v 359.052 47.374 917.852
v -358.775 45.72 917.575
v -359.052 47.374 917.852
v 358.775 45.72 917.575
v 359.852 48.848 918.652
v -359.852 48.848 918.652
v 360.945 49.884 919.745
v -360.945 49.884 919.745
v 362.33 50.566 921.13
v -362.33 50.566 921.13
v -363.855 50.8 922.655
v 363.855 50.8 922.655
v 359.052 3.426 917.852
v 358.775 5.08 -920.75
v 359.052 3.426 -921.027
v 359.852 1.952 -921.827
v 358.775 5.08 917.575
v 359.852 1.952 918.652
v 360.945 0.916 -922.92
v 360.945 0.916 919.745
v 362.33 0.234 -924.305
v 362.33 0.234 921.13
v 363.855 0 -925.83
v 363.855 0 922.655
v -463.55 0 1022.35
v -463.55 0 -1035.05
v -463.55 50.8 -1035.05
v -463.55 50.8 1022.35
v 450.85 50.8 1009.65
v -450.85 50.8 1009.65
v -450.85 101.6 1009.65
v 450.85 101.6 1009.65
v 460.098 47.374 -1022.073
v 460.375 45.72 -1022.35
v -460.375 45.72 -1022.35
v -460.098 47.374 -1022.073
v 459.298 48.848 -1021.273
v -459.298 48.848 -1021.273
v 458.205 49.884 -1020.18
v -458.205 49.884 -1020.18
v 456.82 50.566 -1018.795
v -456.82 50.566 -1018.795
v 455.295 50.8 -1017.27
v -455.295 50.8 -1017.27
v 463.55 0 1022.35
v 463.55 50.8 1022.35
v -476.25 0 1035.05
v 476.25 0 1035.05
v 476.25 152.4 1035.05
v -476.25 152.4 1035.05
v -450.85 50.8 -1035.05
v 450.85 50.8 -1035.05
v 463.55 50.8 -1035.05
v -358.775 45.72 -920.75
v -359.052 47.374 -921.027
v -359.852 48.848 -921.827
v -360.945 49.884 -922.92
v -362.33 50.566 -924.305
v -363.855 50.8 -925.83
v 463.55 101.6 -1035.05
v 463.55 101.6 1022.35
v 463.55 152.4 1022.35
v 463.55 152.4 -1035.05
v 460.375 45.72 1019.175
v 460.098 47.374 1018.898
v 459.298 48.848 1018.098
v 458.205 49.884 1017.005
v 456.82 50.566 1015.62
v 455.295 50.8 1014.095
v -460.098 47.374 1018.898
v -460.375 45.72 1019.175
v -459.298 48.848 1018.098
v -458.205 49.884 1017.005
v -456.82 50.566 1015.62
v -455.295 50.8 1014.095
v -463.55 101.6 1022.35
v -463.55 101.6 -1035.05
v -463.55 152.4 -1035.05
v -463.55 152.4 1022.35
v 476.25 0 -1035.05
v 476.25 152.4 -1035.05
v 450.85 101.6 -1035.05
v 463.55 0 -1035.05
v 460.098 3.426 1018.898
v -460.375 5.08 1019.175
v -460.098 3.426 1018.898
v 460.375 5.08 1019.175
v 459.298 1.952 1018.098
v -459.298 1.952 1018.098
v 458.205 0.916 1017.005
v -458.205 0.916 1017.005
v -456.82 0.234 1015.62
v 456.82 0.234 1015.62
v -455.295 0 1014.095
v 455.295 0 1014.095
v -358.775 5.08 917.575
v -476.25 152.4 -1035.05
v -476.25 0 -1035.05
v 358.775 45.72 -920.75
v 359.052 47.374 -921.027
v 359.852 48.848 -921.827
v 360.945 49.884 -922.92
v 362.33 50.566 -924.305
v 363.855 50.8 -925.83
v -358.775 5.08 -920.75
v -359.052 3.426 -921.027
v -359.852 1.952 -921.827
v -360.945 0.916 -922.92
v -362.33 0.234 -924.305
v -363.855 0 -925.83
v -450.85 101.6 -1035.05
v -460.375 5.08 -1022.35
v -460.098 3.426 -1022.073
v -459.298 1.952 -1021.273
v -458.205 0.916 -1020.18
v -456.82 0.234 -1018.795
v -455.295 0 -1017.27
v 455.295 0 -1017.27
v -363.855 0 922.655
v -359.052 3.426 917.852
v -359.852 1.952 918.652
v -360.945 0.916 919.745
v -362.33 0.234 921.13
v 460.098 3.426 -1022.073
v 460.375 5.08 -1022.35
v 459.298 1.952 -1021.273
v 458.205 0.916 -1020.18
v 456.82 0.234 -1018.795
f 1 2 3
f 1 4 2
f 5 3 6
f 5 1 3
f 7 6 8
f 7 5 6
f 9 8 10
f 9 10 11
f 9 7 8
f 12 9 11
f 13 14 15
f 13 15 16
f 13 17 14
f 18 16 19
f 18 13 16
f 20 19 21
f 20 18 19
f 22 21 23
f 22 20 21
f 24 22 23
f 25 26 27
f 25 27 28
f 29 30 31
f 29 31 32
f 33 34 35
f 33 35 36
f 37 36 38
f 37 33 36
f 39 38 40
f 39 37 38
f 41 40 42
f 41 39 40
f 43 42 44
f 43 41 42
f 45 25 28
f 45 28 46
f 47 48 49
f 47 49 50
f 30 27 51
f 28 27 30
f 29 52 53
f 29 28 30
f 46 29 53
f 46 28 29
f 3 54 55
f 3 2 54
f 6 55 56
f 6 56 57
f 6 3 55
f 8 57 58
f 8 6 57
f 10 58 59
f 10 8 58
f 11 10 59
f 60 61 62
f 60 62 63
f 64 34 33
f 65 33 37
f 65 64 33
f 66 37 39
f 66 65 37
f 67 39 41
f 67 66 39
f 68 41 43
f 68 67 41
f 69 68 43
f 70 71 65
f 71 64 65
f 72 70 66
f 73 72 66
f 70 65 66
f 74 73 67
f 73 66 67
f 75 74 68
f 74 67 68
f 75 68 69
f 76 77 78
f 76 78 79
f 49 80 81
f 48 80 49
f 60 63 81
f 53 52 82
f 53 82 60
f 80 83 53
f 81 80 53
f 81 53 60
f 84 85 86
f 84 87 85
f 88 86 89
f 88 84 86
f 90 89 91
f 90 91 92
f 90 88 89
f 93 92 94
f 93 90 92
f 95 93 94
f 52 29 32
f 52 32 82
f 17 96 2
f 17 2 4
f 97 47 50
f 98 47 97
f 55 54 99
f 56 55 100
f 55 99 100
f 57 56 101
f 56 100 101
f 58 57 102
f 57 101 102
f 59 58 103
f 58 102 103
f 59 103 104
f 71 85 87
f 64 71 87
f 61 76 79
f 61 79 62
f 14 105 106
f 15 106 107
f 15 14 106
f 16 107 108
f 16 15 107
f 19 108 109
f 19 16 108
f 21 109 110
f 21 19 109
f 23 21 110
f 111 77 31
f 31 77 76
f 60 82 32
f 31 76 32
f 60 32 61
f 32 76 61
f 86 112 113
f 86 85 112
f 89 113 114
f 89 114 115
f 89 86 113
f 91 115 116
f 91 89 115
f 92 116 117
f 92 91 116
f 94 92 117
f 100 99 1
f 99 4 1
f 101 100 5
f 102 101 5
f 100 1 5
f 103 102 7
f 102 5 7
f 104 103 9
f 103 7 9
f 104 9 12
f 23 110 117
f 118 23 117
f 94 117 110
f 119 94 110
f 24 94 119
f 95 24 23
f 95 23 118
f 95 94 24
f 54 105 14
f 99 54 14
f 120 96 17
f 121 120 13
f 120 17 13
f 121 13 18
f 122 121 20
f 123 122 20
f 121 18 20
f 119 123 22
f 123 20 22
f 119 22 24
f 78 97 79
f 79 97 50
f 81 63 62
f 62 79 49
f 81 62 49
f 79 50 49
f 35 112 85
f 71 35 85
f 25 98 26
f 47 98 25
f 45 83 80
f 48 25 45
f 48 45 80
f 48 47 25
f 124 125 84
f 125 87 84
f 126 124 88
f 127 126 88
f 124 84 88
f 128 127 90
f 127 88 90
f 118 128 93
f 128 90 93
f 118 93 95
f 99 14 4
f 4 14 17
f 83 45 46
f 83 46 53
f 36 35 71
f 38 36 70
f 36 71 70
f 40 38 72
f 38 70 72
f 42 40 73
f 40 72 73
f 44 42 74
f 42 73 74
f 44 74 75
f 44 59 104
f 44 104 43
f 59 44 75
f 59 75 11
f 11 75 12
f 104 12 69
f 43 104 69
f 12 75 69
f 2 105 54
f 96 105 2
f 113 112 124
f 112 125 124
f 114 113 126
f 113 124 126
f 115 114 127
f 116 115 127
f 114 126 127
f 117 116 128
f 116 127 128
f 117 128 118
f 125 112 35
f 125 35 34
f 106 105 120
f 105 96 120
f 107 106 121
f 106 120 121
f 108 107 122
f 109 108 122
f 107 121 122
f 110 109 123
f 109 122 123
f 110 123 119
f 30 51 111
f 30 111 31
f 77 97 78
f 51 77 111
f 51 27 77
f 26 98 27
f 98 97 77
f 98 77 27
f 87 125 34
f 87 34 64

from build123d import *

# Parameters (mm, degrees)
F1_DEPTH = 152.4
F4_DEPTH = 50.8
F5_W     = 920.75
F5_H     = 2041.525
F5_W_2   = 717.55
F5_H_2   = 1838.325
F6_DEPTH = 50.8
F7_R     = 5.08


with BuildPart() as f1:
    # F0 (on Front) → F1 (new body)
    with BuildSketch(Plane.XZ):
        Polygon((476.25, -1035.05), (476.25, 1035.05), (-476.25, 1035.05), (-476.25, -1035.05), (-463.55, -1035.05), (-463.55, 1022.35), (463.55, 1022.35), (463.55, -1035.05), align=None)
    extrude(amount=-F1_DEPTH)

    # F3 (on offset) → F4 (join)
    with BuildSketch(Plane.XZ.offset(-50.8)):
        Polygon((463.55, -1035.05), (463.55, 1022.35), (-463.55, 1022.35), (-463.55, -1035.05), (-450.85, -1035.05), (-450.85, 1009.65), (450.85, 1009.65), (450.85, -1035.05), align=None)
    extrude(amount=-F4_DEPTH)


with BuildPart() as f6:
    # F5 (on face) → F6 (new body)
    with BuildSketch(Plane.XZ):
        with Locations((0, -1.5875)):
            Rectangle(F5_W, F5_H)
        with Locations((0, -1.5875)):
            Rectangle(F5_W_2, F5_H_2, mode=Mode.SUBTRACT)
    extrude(amount=-F6_DEPTH)

    # F7
    f7_edges = [f6.edges().sort_by_distance(p)[0] for p in [
        (460.375, 0, -1.5875),
        (0, 0, 1019.175),
        (-460.375, 0, -1.5875),
        (0, 0, -1022.35),
        (0, 0, -920.75),
        (-358.775, 0, -1.5875),
        (0, 0, 917.575),
        (358.775, 0, -1.5875),
        (460.375, 50.8, -1.5875),
        (0, 50.8, 1019.175),
        (-460.375, 50.8, -1.5875),
        (0, 50.8, -1022.35),
        (0, 50.8, -920.75),
        (-358.775, 50.8, -1.5875),
        (0, 50.8, 917.575),
        (358.775, 50.8, -1.5875),
    ]]
    fillet(f7_edges, radius=F7_R)


solid = Compound([f1.part, f6.part])
